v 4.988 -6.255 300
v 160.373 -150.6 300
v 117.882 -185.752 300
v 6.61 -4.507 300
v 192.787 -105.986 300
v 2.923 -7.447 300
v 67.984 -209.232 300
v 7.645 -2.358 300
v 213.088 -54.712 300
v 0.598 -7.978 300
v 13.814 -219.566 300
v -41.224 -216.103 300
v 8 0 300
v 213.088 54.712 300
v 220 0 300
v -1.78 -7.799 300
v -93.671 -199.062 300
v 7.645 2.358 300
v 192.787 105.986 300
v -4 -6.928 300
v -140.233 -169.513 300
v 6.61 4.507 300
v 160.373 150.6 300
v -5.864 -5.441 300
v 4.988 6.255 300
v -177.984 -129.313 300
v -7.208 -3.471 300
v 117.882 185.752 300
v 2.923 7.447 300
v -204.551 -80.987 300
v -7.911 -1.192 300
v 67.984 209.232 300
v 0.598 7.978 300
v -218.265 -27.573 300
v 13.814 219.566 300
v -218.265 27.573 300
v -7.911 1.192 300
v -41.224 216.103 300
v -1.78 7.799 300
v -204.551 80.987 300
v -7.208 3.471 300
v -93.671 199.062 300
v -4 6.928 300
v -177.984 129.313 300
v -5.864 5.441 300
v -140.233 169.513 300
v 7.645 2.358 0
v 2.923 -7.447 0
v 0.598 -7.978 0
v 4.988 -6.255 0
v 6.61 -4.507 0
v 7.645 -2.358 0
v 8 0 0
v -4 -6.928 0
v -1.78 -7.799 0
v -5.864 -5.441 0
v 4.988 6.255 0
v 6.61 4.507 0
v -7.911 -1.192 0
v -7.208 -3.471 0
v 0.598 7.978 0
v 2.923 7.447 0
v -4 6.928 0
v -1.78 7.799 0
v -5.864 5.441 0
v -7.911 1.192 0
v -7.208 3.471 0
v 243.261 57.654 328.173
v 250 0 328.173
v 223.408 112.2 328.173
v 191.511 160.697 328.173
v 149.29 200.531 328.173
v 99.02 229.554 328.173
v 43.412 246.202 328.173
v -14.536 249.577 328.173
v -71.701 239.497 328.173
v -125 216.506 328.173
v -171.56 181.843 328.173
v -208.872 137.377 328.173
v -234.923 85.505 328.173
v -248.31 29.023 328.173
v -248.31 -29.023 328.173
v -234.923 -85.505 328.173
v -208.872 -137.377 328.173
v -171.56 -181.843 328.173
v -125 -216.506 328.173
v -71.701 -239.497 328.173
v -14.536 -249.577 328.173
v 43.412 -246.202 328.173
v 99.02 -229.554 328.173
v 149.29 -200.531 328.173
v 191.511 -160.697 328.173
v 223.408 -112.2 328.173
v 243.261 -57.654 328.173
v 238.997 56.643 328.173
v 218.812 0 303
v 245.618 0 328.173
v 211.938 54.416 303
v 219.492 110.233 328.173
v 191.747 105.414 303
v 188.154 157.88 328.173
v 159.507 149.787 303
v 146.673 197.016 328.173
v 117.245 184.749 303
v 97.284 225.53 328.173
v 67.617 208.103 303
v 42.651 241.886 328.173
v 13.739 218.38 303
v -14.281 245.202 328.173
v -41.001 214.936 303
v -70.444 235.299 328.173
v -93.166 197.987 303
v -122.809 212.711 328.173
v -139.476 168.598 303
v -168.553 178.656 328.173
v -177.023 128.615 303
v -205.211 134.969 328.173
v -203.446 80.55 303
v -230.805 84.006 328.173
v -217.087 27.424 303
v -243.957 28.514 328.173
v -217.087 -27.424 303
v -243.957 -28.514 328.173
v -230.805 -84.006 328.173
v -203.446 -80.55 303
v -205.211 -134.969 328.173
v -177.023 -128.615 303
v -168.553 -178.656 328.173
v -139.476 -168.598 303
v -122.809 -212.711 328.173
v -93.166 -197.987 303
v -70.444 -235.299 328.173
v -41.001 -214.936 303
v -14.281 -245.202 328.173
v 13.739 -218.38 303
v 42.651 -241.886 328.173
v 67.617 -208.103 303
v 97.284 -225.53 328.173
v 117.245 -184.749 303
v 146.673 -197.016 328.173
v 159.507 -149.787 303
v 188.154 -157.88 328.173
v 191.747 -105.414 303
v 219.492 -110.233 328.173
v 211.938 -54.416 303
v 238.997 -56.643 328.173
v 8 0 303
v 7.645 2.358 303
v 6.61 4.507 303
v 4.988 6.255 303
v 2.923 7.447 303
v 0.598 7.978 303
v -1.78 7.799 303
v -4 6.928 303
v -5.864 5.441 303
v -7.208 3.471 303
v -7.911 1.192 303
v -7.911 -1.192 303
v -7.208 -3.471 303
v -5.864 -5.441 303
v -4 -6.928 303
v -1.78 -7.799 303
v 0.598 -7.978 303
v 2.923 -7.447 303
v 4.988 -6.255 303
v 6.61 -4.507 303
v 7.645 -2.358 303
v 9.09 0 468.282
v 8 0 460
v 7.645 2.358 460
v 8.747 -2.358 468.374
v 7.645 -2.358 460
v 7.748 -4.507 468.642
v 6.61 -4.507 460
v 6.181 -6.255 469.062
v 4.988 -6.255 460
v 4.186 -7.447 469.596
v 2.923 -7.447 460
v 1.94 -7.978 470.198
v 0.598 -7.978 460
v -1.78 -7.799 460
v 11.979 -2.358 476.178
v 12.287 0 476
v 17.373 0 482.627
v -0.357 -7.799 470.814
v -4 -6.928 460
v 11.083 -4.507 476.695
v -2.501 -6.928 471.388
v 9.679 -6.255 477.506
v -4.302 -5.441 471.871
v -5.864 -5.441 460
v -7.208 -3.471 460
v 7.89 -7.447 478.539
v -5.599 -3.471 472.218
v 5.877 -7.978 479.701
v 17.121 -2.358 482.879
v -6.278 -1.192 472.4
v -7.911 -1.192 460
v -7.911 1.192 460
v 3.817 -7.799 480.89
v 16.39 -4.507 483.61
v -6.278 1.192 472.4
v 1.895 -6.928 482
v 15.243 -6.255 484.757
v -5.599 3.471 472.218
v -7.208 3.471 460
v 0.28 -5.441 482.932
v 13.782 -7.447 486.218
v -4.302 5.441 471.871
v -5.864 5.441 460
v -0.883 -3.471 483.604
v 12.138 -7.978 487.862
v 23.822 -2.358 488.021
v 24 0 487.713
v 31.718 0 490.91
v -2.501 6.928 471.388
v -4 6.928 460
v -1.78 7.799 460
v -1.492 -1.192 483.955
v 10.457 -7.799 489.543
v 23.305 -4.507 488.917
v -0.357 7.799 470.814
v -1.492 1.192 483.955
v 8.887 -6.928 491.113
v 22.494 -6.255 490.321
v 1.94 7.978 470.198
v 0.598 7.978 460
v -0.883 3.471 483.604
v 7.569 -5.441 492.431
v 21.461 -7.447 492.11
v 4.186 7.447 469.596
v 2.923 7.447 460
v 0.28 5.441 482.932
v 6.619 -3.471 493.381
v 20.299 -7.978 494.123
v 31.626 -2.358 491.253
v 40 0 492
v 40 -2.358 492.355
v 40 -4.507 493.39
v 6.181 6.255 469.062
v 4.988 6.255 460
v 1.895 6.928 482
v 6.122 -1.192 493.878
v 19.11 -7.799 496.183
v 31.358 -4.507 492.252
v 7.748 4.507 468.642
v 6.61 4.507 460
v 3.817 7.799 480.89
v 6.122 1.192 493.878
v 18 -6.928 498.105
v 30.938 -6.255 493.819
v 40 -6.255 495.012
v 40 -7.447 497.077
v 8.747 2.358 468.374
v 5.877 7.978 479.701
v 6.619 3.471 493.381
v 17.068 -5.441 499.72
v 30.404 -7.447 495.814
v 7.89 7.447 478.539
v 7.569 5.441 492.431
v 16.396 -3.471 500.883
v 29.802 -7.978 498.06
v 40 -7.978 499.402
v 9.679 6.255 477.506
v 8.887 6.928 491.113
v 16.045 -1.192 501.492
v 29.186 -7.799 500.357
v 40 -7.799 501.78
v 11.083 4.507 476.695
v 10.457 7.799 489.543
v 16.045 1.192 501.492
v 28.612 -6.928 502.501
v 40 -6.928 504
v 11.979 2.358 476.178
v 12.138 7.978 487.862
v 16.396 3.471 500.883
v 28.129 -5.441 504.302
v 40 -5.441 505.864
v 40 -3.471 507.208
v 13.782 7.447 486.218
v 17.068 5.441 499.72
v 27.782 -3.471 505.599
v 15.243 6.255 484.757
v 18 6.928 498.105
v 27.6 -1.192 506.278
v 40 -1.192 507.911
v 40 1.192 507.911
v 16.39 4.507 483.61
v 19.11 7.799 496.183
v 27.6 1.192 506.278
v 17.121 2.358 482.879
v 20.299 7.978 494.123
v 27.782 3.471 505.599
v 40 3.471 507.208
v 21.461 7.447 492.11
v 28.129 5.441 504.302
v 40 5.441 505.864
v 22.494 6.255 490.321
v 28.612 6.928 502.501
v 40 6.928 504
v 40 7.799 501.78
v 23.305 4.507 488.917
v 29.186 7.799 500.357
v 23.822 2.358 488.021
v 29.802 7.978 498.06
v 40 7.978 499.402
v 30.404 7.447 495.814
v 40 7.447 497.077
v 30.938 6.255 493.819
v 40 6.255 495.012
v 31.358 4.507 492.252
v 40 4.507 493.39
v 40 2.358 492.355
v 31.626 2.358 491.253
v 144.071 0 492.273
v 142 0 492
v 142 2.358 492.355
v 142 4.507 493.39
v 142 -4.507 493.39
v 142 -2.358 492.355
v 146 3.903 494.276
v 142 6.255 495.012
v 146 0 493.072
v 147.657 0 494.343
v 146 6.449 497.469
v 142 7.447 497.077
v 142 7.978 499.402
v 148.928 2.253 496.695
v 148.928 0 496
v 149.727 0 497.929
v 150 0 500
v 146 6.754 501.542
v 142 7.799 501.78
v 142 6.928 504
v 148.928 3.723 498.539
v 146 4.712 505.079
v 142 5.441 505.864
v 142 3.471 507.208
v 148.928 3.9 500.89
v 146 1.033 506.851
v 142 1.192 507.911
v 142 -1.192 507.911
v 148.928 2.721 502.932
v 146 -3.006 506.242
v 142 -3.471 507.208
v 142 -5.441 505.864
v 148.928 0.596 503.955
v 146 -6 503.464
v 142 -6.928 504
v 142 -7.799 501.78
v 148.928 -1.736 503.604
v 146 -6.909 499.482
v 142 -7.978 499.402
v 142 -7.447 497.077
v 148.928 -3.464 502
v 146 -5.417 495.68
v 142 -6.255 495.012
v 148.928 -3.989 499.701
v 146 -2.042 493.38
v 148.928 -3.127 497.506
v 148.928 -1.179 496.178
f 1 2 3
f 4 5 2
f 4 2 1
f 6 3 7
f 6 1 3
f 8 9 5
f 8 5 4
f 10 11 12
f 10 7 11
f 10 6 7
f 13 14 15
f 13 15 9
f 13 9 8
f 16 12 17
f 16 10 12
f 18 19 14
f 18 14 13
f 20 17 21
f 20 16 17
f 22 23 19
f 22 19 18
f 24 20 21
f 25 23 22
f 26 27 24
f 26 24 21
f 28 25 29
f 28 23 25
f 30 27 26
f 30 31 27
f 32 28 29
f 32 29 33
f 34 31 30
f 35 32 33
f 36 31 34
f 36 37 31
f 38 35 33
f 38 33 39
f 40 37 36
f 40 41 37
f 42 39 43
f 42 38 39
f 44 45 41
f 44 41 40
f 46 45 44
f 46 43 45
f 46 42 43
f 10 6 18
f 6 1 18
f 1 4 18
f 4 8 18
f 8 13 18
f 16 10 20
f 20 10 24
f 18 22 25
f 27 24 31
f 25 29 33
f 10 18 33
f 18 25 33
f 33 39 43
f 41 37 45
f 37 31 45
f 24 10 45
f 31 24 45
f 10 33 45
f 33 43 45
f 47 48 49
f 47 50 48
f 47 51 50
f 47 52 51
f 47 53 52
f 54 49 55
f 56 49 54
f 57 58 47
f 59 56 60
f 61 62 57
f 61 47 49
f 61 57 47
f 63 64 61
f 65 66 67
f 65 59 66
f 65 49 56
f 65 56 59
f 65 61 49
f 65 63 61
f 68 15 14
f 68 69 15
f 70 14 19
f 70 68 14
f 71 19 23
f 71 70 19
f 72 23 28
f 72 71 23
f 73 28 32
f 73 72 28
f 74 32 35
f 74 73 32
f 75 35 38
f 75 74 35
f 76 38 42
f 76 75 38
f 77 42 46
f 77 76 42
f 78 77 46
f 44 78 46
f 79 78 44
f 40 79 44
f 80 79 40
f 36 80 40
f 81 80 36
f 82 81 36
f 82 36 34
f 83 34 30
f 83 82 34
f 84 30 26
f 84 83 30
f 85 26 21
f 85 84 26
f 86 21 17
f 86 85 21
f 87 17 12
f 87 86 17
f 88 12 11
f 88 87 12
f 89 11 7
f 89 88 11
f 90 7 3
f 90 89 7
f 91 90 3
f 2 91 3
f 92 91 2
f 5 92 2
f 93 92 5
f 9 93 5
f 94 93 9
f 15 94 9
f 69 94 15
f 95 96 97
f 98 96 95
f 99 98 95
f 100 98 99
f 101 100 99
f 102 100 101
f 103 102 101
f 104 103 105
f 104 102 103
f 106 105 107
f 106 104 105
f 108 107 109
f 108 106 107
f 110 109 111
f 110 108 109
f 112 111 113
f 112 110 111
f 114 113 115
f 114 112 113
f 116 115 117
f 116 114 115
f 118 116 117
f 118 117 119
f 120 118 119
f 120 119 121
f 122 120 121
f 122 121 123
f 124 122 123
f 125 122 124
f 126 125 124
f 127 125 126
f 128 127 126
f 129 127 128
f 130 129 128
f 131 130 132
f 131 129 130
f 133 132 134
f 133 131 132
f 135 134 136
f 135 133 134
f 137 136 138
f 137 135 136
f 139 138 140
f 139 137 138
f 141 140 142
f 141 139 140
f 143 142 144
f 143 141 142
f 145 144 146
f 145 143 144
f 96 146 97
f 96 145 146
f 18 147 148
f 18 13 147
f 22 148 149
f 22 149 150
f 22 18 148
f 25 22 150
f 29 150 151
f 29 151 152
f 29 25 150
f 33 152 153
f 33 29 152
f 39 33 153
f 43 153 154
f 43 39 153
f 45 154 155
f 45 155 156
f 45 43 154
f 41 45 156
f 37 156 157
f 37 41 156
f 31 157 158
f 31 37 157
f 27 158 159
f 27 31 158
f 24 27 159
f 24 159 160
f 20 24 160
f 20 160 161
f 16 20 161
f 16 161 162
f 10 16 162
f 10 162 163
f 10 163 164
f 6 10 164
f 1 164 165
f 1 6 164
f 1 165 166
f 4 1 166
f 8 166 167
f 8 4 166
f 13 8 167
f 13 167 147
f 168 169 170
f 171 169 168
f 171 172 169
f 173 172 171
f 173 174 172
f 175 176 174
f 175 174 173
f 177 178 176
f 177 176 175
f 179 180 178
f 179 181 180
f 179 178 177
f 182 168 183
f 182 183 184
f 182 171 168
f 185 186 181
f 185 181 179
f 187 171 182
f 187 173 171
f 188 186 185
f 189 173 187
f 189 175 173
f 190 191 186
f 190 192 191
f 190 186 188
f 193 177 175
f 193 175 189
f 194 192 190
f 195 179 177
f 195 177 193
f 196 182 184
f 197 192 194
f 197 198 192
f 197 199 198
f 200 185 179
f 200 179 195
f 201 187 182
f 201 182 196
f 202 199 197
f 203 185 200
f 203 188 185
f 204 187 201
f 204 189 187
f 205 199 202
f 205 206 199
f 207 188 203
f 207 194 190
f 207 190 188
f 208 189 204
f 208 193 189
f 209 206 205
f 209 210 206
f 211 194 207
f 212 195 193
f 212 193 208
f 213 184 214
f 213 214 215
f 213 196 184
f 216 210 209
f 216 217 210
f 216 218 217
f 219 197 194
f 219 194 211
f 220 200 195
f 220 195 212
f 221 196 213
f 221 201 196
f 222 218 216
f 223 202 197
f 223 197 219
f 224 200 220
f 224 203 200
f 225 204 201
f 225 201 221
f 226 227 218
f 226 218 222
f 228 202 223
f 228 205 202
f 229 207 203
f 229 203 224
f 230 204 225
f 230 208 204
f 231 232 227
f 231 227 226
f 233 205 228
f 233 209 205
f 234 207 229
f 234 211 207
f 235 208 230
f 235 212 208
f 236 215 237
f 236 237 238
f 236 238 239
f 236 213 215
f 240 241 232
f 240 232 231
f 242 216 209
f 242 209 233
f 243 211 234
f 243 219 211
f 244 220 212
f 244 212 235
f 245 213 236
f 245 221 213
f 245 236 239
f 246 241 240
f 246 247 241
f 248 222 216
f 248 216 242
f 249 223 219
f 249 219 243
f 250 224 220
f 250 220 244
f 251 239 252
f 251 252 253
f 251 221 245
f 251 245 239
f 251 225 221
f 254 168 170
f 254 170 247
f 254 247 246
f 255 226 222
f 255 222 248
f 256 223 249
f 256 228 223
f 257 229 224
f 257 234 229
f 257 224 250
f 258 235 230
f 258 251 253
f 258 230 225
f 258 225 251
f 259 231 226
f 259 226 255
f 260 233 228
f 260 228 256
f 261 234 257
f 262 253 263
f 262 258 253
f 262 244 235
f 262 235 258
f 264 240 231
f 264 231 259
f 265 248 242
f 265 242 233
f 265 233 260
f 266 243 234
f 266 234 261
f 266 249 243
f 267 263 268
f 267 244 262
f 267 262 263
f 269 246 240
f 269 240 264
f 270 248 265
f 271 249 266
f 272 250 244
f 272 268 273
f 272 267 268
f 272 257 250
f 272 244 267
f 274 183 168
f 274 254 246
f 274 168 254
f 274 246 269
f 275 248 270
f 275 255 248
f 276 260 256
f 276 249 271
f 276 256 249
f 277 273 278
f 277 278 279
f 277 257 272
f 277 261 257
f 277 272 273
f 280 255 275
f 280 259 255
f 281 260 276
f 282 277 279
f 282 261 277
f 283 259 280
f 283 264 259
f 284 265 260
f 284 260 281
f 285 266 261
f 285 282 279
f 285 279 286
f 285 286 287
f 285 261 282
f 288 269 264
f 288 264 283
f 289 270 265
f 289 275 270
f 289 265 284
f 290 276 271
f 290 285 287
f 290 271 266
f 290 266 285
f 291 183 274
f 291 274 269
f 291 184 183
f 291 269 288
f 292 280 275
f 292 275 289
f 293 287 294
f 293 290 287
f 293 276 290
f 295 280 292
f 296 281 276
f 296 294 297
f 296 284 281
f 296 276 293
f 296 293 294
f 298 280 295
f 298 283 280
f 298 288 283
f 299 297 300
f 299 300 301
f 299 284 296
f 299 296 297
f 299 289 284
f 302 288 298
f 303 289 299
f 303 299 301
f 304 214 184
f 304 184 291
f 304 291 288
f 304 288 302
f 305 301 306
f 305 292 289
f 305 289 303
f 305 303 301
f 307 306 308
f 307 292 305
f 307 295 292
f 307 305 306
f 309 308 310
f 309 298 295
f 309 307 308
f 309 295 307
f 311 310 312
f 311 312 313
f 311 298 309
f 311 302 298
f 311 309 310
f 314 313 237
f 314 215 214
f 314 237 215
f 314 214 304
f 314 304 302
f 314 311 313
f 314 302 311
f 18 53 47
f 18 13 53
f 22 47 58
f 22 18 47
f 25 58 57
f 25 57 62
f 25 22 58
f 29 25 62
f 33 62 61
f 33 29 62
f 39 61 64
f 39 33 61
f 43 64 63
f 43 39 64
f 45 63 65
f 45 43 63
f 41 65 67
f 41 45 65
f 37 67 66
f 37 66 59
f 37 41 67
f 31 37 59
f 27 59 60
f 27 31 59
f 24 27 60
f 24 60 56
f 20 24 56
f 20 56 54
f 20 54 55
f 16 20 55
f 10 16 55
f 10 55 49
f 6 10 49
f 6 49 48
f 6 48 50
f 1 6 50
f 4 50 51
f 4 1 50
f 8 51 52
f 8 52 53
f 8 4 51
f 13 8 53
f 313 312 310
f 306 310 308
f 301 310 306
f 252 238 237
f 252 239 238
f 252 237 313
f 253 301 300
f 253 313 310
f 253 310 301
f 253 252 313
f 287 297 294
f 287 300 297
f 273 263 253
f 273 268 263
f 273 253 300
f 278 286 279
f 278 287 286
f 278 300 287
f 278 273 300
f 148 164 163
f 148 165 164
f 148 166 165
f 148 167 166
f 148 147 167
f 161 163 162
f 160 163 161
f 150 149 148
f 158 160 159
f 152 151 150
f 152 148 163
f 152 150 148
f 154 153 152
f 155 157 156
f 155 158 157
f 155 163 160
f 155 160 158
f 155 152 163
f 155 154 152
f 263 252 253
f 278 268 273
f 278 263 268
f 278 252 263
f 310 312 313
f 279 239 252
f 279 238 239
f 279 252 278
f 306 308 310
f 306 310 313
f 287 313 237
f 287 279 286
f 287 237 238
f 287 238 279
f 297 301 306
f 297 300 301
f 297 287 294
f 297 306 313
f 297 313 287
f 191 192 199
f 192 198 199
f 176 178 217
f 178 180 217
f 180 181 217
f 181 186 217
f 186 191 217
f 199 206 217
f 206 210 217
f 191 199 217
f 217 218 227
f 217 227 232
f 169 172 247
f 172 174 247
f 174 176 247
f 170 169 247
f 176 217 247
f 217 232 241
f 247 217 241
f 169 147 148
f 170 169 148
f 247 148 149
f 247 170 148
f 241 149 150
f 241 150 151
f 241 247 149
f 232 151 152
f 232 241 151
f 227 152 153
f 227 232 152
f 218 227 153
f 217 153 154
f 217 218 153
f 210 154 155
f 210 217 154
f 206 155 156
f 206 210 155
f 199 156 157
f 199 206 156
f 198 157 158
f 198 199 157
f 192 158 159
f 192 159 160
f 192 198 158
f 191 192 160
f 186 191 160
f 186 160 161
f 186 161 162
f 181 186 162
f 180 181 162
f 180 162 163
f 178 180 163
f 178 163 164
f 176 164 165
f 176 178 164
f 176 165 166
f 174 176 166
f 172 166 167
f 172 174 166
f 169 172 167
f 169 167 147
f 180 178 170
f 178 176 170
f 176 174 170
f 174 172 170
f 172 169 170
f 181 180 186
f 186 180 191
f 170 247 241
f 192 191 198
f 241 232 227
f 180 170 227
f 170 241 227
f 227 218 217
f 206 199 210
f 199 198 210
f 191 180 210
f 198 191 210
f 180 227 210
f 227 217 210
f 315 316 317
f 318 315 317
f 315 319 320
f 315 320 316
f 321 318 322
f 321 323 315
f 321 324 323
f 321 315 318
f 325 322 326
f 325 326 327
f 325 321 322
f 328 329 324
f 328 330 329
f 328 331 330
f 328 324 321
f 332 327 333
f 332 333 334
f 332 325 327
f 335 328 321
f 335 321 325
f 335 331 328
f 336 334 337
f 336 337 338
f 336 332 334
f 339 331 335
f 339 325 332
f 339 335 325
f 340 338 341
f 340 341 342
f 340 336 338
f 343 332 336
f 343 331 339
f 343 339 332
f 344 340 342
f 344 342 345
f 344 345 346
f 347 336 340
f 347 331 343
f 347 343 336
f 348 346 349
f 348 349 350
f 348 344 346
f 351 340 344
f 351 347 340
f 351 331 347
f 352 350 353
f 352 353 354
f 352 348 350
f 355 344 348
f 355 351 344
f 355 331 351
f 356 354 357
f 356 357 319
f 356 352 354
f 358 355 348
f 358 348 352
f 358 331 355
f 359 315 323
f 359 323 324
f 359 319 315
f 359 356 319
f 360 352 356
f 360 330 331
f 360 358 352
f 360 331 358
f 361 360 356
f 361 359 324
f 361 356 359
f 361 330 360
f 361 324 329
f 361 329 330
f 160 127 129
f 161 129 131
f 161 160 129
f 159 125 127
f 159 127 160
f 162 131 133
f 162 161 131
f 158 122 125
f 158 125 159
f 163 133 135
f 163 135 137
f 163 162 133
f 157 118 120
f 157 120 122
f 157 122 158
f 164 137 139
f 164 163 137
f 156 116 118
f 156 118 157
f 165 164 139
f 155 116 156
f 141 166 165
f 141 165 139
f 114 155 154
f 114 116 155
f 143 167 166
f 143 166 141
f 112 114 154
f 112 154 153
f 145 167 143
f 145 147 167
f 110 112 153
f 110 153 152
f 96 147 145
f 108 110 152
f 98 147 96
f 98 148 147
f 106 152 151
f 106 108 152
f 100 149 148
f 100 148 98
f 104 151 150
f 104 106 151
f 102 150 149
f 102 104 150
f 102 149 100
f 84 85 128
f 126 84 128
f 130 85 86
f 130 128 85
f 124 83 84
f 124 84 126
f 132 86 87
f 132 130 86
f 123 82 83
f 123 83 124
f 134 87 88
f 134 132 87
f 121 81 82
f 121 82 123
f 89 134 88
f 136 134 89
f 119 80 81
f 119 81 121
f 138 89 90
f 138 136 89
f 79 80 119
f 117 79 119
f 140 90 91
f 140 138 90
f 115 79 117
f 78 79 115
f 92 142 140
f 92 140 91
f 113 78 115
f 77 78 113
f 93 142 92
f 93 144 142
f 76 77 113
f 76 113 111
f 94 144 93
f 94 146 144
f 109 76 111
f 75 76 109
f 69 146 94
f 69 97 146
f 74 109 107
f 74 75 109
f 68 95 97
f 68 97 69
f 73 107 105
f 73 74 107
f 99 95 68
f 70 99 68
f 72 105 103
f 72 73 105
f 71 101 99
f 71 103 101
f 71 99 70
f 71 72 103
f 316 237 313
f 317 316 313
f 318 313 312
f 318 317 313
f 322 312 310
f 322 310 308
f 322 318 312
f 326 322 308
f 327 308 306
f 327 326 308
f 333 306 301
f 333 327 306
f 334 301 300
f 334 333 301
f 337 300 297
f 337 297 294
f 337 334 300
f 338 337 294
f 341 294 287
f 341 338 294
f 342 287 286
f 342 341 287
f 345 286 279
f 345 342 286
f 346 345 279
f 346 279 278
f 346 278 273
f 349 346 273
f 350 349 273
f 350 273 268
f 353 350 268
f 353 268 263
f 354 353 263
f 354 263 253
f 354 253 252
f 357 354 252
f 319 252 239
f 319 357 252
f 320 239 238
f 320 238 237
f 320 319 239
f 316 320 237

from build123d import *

# Parameters (mm, degrees)
F0_W      = 8
F0_H      = 157
F0_H_2    = 300
F2_FACE_R = 8


with BuildPart() as f1:
    # F0 (on Front) → F1 (revolve)
    with BuildSketch(Plane.XZ):
        Polygon((8, 303), (8, 300), (220, 300), (250, 328.17252), (245.617594, 328.17252), (218.812196, 303), align=None)
    revolve(axis=Axis((0, 0, 230), (0, 0, 1)))


with BuildPart() as f2:
    # F0 (on Front) → F2 (revolve)
    with BuildSketch(Plane.XZ):
        with Locations((4, 381.5)):
            Rectangle(F0_W, F0_H)
    revolve(axis=Axis((0, 0, 230), (0, 0, 1)))


with BuildPart() as f3:
    # F0 (on Front) → F3 (revolve)
    with BuildSketch(Plane.XZ):
        with BuildLine():
            Line((142, 500), (40, 500))
            Line((40, 500), (40, 492))
            Line((40, 492), (142, 492))
            ThreePointArc((142, 492), (147.656854, 494.343146), (150, 500))
            Line((150, 500), (142, 500))
        make_face()
    revolve(axis=Axis((91, 0, 500), (1, 0, 0)))


with BuildPart() as f4:
    # F0 (on Front) → F4 (revolve)
    with BuildSketch(Plane.XZ):
        with Locations((4, 150)):
            Rectangle(F0_W, F0_H_2)
    revolve(axis=Axis((0, 0, 230), (0, 0, 1)))


with BuildPart() as f5:
    # F5: sweep along a path in F0
    with BuildLine(Plane.XZ) as f5_path:
        ThreePointArc((0, 460), (11.715729, 488.284271), (40, 500))
    # F2_face (on face) → F5 (sweep)
    with BuildSketch(Plane.XY.offset(460)):
        Circle(F2_FACE_R)
    sweep(path=f5_path.line)


solid = Compound([f1.part, f2.part, f3.part, f4.part, f5.part])
